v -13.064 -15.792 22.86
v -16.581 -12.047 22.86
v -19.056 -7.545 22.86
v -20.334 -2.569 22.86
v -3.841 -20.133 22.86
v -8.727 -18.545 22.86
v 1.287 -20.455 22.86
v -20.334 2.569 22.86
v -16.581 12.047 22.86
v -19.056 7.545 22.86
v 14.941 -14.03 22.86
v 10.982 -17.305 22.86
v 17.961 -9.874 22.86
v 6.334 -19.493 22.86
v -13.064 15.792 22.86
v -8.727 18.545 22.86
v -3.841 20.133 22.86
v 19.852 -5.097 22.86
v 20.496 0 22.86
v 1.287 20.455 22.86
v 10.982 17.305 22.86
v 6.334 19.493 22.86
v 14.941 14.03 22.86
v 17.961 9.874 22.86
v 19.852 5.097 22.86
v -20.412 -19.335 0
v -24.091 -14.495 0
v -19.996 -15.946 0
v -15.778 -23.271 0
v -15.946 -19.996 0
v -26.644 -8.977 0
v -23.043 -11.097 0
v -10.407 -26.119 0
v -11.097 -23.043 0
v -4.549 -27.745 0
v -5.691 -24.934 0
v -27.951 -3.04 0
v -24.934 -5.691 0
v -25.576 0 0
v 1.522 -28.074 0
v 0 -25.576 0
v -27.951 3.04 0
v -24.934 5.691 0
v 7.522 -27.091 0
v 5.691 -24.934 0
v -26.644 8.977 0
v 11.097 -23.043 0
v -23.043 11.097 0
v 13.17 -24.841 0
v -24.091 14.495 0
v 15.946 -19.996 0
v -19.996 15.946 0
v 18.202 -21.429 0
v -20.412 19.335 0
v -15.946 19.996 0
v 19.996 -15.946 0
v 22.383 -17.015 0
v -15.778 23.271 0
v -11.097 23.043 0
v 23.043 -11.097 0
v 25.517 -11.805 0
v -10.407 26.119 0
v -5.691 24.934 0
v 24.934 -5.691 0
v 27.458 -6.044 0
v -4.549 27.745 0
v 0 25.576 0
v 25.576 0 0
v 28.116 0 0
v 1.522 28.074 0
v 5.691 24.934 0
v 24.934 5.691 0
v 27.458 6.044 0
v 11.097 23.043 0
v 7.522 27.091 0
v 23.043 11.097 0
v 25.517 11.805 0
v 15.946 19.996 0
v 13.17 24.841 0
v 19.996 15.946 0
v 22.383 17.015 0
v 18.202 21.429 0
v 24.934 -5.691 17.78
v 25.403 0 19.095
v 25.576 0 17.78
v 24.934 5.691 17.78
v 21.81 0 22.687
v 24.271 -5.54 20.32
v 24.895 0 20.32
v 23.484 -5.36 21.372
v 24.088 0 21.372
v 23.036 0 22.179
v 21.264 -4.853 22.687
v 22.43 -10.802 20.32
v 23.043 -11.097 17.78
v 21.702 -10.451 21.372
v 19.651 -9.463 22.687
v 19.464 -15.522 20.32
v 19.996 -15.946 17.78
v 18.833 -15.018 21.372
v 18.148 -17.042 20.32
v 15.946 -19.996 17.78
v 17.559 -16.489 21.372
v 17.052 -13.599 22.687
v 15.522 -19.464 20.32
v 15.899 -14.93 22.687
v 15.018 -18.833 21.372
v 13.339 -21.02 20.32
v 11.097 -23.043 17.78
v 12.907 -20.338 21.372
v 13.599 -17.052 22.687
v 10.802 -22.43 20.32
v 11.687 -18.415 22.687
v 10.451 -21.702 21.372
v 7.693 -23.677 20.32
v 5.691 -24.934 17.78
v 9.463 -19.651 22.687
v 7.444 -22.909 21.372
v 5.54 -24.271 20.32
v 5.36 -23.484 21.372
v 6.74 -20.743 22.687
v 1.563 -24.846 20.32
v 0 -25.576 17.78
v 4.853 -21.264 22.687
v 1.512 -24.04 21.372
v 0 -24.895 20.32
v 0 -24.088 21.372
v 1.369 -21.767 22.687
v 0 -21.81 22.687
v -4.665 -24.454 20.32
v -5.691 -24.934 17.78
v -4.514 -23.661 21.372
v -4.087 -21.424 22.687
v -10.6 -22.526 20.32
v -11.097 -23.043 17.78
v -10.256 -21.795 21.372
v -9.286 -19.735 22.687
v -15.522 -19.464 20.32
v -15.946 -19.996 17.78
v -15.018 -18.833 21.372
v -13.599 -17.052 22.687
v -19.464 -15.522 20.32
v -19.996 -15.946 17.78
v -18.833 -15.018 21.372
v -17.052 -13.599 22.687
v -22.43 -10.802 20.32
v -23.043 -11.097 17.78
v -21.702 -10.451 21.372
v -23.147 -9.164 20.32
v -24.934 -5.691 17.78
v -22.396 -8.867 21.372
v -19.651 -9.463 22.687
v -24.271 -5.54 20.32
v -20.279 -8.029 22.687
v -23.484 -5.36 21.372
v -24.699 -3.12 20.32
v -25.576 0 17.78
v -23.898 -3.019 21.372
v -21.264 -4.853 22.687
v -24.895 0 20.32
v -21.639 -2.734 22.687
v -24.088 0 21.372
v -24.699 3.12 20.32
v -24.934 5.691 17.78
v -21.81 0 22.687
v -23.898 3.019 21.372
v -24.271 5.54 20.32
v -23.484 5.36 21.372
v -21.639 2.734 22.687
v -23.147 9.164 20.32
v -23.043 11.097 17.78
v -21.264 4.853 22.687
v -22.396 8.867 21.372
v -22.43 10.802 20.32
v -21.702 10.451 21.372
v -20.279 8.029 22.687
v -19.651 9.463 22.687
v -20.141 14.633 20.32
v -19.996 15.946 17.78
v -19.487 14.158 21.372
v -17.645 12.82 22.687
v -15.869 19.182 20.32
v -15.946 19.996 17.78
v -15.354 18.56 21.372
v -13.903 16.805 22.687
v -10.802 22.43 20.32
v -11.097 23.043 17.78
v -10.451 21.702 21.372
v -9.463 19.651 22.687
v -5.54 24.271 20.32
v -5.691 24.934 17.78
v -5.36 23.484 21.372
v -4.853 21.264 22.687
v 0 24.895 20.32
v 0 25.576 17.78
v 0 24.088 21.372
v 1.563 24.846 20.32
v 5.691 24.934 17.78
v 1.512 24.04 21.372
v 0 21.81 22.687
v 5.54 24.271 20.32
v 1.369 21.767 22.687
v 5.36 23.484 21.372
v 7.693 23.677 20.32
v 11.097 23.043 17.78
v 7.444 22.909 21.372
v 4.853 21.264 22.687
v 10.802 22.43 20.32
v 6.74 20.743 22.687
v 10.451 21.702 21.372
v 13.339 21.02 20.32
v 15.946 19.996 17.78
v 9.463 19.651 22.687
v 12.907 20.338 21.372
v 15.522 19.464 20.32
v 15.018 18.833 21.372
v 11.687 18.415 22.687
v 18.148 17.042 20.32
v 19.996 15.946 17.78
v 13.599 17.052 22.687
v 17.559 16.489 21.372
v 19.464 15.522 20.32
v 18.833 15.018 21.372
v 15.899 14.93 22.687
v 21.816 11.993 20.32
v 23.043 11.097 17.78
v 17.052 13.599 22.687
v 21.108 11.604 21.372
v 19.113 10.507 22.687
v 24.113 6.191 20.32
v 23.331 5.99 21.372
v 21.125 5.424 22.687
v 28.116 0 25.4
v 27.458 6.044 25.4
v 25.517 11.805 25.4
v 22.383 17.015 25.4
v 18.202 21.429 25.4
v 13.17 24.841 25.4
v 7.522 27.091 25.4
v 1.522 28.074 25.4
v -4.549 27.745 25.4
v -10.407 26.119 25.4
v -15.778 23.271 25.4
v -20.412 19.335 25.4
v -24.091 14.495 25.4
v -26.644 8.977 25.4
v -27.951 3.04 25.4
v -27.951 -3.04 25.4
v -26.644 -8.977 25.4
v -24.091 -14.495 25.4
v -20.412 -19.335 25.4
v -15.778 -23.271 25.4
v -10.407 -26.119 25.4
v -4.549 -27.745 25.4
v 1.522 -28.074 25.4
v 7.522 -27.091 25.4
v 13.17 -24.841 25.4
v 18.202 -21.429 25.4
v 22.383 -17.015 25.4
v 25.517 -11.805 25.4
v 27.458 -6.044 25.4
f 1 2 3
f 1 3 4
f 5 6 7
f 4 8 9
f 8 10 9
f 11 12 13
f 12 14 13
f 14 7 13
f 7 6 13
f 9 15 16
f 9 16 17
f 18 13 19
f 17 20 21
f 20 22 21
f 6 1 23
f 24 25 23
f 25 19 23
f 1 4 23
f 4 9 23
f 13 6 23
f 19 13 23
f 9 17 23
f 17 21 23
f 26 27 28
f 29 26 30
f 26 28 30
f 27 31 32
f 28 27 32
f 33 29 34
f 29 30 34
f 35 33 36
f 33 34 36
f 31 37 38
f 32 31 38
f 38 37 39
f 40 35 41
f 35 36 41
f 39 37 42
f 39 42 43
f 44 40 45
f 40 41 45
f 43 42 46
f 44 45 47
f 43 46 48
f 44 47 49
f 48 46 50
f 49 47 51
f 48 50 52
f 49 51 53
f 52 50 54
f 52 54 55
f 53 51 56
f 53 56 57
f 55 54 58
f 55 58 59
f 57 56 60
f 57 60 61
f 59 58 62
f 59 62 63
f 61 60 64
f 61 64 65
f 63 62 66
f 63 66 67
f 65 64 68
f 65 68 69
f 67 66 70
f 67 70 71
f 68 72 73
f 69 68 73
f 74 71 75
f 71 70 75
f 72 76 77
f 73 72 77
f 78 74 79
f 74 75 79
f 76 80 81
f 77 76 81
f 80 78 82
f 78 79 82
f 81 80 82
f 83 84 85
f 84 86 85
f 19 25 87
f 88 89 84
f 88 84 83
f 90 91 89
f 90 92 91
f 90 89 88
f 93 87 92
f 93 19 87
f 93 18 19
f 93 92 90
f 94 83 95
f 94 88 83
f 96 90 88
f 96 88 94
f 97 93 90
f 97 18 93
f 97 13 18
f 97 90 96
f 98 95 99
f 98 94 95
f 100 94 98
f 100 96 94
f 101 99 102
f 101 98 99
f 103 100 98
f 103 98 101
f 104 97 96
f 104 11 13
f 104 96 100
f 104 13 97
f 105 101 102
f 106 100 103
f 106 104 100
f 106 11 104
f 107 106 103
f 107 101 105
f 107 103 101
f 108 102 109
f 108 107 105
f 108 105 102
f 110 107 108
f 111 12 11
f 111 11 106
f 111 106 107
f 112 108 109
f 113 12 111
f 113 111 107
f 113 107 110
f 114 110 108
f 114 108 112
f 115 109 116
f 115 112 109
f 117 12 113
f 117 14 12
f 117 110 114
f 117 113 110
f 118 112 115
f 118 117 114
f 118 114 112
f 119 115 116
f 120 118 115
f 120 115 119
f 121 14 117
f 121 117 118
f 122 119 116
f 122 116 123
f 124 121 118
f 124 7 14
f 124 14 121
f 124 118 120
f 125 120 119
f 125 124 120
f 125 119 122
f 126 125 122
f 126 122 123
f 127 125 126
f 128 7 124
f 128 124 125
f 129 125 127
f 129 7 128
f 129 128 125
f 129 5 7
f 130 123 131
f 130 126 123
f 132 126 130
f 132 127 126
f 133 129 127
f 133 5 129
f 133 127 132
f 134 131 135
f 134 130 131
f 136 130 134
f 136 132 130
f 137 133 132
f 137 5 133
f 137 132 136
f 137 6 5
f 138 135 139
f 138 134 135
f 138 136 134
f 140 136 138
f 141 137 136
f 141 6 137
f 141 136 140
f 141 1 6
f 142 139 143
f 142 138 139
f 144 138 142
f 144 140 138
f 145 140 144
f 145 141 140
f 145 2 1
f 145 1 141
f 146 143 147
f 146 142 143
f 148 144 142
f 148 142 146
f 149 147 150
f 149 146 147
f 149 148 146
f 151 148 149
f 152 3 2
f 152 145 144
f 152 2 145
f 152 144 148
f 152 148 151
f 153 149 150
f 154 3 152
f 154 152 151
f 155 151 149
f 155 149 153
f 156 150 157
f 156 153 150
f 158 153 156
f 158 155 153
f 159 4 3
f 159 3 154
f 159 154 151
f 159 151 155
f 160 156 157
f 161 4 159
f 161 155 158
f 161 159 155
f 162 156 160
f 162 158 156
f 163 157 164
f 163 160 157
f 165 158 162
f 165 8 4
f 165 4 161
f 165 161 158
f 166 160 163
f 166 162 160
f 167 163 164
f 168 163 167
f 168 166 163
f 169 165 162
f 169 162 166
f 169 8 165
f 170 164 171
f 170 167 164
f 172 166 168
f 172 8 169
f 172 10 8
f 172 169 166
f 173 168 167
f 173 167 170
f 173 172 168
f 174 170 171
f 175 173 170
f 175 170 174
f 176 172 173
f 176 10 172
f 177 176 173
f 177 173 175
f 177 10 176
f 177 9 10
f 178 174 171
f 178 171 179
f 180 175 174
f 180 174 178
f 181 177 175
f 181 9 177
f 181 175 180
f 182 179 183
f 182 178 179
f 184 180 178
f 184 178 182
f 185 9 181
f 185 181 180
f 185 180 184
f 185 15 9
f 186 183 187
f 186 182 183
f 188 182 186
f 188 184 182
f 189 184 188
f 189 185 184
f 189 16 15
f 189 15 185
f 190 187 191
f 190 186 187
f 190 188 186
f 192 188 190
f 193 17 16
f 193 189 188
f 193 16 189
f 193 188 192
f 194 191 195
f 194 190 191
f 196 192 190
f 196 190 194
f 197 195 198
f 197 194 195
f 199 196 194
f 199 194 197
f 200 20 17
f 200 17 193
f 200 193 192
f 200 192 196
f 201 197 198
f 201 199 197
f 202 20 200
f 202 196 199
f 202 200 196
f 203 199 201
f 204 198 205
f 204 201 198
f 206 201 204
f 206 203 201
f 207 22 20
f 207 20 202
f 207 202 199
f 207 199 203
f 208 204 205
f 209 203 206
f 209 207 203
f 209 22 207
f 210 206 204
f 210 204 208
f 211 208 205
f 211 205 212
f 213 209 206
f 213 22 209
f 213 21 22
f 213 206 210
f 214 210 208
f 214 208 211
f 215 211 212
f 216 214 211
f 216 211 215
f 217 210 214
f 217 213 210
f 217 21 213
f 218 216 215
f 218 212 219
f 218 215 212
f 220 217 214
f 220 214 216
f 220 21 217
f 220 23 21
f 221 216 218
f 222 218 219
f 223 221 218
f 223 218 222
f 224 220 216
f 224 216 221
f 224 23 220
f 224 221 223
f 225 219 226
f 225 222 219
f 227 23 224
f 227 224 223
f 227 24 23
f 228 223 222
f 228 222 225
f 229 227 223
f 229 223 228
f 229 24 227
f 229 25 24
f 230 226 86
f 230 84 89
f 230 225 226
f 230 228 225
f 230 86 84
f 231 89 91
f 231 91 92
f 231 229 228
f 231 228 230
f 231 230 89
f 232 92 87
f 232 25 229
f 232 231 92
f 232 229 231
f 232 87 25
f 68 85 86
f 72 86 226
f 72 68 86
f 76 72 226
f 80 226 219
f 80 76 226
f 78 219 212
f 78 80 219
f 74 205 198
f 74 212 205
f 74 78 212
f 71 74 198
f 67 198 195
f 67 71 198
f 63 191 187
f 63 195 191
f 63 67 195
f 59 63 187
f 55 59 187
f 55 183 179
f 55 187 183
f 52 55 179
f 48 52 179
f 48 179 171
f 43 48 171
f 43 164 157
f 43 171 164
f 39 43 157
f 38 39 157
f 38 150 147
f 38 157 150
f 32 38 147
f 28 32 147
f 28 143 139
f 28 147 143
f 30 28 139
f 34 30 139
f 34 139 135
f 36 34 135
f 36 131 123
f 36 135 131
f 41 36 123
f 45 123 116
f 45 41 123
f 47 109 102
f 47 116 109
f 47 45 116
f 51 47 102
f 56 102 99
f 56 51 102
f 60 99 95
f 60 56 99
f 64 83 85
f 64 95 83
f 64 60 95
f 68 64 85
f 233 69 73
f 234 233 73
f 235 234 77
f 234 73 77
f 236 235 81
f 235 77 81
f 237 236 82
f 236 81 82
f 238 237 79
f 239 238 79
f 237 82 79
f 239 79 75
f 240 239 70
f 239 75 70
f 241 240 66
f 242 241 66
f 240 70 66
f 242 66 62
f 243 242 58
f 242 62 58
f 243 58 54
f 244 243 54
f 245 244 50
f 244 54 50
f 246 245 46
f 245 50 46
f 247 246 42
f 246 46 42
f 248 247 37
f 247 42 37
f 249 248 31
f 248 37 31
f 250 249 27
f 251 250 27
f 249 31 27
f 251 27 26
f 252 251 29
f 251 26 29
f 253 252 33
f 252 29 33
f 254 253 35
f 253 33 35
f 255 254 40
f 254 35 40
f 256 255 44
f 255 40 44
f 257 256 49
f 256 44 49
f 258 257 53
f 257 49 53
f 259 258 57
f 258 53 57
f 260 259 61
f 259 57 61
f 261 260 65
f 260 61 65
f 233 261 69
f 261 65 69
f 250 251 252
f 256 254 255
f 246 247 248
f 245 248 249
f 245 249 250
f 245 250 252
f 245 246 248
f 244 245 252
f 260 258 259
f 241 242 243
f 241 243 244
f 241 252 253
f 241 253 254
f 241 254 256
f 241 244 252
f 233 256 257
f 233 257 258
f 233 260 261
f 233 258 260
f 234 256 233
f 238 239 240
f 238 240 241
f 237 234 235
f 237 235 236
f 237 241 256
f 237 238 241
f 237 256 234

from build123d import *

# Parameters (mm, degrees)
F0_R     = 28.1156832237
F1_DEPTH = 25.4
F2_T     = -2.54
F3_R     = 5.08


with BuildPart() as f1:
    # F0 (on Top) → F1 (new body)
    with BuildSketch(Plane.XY):
        Circle(F0_R)
    extrude(amount=F1_DEPTH)

    # F2
    f2_openings = [f1.faces().sort_by_distance(p)[0] for p in [
        (0, 0, 0),
    ]]
    offset(amount=F2_T, openings=f2_openings)

    # F3
    f3_edges = [f1.edges().sort_by_distance(p)[0] for p in [
        (-25.575683, 0, 22.86),
    ]]
    fillet(f3_edges, radius=F3_R)


solid = f1.part
